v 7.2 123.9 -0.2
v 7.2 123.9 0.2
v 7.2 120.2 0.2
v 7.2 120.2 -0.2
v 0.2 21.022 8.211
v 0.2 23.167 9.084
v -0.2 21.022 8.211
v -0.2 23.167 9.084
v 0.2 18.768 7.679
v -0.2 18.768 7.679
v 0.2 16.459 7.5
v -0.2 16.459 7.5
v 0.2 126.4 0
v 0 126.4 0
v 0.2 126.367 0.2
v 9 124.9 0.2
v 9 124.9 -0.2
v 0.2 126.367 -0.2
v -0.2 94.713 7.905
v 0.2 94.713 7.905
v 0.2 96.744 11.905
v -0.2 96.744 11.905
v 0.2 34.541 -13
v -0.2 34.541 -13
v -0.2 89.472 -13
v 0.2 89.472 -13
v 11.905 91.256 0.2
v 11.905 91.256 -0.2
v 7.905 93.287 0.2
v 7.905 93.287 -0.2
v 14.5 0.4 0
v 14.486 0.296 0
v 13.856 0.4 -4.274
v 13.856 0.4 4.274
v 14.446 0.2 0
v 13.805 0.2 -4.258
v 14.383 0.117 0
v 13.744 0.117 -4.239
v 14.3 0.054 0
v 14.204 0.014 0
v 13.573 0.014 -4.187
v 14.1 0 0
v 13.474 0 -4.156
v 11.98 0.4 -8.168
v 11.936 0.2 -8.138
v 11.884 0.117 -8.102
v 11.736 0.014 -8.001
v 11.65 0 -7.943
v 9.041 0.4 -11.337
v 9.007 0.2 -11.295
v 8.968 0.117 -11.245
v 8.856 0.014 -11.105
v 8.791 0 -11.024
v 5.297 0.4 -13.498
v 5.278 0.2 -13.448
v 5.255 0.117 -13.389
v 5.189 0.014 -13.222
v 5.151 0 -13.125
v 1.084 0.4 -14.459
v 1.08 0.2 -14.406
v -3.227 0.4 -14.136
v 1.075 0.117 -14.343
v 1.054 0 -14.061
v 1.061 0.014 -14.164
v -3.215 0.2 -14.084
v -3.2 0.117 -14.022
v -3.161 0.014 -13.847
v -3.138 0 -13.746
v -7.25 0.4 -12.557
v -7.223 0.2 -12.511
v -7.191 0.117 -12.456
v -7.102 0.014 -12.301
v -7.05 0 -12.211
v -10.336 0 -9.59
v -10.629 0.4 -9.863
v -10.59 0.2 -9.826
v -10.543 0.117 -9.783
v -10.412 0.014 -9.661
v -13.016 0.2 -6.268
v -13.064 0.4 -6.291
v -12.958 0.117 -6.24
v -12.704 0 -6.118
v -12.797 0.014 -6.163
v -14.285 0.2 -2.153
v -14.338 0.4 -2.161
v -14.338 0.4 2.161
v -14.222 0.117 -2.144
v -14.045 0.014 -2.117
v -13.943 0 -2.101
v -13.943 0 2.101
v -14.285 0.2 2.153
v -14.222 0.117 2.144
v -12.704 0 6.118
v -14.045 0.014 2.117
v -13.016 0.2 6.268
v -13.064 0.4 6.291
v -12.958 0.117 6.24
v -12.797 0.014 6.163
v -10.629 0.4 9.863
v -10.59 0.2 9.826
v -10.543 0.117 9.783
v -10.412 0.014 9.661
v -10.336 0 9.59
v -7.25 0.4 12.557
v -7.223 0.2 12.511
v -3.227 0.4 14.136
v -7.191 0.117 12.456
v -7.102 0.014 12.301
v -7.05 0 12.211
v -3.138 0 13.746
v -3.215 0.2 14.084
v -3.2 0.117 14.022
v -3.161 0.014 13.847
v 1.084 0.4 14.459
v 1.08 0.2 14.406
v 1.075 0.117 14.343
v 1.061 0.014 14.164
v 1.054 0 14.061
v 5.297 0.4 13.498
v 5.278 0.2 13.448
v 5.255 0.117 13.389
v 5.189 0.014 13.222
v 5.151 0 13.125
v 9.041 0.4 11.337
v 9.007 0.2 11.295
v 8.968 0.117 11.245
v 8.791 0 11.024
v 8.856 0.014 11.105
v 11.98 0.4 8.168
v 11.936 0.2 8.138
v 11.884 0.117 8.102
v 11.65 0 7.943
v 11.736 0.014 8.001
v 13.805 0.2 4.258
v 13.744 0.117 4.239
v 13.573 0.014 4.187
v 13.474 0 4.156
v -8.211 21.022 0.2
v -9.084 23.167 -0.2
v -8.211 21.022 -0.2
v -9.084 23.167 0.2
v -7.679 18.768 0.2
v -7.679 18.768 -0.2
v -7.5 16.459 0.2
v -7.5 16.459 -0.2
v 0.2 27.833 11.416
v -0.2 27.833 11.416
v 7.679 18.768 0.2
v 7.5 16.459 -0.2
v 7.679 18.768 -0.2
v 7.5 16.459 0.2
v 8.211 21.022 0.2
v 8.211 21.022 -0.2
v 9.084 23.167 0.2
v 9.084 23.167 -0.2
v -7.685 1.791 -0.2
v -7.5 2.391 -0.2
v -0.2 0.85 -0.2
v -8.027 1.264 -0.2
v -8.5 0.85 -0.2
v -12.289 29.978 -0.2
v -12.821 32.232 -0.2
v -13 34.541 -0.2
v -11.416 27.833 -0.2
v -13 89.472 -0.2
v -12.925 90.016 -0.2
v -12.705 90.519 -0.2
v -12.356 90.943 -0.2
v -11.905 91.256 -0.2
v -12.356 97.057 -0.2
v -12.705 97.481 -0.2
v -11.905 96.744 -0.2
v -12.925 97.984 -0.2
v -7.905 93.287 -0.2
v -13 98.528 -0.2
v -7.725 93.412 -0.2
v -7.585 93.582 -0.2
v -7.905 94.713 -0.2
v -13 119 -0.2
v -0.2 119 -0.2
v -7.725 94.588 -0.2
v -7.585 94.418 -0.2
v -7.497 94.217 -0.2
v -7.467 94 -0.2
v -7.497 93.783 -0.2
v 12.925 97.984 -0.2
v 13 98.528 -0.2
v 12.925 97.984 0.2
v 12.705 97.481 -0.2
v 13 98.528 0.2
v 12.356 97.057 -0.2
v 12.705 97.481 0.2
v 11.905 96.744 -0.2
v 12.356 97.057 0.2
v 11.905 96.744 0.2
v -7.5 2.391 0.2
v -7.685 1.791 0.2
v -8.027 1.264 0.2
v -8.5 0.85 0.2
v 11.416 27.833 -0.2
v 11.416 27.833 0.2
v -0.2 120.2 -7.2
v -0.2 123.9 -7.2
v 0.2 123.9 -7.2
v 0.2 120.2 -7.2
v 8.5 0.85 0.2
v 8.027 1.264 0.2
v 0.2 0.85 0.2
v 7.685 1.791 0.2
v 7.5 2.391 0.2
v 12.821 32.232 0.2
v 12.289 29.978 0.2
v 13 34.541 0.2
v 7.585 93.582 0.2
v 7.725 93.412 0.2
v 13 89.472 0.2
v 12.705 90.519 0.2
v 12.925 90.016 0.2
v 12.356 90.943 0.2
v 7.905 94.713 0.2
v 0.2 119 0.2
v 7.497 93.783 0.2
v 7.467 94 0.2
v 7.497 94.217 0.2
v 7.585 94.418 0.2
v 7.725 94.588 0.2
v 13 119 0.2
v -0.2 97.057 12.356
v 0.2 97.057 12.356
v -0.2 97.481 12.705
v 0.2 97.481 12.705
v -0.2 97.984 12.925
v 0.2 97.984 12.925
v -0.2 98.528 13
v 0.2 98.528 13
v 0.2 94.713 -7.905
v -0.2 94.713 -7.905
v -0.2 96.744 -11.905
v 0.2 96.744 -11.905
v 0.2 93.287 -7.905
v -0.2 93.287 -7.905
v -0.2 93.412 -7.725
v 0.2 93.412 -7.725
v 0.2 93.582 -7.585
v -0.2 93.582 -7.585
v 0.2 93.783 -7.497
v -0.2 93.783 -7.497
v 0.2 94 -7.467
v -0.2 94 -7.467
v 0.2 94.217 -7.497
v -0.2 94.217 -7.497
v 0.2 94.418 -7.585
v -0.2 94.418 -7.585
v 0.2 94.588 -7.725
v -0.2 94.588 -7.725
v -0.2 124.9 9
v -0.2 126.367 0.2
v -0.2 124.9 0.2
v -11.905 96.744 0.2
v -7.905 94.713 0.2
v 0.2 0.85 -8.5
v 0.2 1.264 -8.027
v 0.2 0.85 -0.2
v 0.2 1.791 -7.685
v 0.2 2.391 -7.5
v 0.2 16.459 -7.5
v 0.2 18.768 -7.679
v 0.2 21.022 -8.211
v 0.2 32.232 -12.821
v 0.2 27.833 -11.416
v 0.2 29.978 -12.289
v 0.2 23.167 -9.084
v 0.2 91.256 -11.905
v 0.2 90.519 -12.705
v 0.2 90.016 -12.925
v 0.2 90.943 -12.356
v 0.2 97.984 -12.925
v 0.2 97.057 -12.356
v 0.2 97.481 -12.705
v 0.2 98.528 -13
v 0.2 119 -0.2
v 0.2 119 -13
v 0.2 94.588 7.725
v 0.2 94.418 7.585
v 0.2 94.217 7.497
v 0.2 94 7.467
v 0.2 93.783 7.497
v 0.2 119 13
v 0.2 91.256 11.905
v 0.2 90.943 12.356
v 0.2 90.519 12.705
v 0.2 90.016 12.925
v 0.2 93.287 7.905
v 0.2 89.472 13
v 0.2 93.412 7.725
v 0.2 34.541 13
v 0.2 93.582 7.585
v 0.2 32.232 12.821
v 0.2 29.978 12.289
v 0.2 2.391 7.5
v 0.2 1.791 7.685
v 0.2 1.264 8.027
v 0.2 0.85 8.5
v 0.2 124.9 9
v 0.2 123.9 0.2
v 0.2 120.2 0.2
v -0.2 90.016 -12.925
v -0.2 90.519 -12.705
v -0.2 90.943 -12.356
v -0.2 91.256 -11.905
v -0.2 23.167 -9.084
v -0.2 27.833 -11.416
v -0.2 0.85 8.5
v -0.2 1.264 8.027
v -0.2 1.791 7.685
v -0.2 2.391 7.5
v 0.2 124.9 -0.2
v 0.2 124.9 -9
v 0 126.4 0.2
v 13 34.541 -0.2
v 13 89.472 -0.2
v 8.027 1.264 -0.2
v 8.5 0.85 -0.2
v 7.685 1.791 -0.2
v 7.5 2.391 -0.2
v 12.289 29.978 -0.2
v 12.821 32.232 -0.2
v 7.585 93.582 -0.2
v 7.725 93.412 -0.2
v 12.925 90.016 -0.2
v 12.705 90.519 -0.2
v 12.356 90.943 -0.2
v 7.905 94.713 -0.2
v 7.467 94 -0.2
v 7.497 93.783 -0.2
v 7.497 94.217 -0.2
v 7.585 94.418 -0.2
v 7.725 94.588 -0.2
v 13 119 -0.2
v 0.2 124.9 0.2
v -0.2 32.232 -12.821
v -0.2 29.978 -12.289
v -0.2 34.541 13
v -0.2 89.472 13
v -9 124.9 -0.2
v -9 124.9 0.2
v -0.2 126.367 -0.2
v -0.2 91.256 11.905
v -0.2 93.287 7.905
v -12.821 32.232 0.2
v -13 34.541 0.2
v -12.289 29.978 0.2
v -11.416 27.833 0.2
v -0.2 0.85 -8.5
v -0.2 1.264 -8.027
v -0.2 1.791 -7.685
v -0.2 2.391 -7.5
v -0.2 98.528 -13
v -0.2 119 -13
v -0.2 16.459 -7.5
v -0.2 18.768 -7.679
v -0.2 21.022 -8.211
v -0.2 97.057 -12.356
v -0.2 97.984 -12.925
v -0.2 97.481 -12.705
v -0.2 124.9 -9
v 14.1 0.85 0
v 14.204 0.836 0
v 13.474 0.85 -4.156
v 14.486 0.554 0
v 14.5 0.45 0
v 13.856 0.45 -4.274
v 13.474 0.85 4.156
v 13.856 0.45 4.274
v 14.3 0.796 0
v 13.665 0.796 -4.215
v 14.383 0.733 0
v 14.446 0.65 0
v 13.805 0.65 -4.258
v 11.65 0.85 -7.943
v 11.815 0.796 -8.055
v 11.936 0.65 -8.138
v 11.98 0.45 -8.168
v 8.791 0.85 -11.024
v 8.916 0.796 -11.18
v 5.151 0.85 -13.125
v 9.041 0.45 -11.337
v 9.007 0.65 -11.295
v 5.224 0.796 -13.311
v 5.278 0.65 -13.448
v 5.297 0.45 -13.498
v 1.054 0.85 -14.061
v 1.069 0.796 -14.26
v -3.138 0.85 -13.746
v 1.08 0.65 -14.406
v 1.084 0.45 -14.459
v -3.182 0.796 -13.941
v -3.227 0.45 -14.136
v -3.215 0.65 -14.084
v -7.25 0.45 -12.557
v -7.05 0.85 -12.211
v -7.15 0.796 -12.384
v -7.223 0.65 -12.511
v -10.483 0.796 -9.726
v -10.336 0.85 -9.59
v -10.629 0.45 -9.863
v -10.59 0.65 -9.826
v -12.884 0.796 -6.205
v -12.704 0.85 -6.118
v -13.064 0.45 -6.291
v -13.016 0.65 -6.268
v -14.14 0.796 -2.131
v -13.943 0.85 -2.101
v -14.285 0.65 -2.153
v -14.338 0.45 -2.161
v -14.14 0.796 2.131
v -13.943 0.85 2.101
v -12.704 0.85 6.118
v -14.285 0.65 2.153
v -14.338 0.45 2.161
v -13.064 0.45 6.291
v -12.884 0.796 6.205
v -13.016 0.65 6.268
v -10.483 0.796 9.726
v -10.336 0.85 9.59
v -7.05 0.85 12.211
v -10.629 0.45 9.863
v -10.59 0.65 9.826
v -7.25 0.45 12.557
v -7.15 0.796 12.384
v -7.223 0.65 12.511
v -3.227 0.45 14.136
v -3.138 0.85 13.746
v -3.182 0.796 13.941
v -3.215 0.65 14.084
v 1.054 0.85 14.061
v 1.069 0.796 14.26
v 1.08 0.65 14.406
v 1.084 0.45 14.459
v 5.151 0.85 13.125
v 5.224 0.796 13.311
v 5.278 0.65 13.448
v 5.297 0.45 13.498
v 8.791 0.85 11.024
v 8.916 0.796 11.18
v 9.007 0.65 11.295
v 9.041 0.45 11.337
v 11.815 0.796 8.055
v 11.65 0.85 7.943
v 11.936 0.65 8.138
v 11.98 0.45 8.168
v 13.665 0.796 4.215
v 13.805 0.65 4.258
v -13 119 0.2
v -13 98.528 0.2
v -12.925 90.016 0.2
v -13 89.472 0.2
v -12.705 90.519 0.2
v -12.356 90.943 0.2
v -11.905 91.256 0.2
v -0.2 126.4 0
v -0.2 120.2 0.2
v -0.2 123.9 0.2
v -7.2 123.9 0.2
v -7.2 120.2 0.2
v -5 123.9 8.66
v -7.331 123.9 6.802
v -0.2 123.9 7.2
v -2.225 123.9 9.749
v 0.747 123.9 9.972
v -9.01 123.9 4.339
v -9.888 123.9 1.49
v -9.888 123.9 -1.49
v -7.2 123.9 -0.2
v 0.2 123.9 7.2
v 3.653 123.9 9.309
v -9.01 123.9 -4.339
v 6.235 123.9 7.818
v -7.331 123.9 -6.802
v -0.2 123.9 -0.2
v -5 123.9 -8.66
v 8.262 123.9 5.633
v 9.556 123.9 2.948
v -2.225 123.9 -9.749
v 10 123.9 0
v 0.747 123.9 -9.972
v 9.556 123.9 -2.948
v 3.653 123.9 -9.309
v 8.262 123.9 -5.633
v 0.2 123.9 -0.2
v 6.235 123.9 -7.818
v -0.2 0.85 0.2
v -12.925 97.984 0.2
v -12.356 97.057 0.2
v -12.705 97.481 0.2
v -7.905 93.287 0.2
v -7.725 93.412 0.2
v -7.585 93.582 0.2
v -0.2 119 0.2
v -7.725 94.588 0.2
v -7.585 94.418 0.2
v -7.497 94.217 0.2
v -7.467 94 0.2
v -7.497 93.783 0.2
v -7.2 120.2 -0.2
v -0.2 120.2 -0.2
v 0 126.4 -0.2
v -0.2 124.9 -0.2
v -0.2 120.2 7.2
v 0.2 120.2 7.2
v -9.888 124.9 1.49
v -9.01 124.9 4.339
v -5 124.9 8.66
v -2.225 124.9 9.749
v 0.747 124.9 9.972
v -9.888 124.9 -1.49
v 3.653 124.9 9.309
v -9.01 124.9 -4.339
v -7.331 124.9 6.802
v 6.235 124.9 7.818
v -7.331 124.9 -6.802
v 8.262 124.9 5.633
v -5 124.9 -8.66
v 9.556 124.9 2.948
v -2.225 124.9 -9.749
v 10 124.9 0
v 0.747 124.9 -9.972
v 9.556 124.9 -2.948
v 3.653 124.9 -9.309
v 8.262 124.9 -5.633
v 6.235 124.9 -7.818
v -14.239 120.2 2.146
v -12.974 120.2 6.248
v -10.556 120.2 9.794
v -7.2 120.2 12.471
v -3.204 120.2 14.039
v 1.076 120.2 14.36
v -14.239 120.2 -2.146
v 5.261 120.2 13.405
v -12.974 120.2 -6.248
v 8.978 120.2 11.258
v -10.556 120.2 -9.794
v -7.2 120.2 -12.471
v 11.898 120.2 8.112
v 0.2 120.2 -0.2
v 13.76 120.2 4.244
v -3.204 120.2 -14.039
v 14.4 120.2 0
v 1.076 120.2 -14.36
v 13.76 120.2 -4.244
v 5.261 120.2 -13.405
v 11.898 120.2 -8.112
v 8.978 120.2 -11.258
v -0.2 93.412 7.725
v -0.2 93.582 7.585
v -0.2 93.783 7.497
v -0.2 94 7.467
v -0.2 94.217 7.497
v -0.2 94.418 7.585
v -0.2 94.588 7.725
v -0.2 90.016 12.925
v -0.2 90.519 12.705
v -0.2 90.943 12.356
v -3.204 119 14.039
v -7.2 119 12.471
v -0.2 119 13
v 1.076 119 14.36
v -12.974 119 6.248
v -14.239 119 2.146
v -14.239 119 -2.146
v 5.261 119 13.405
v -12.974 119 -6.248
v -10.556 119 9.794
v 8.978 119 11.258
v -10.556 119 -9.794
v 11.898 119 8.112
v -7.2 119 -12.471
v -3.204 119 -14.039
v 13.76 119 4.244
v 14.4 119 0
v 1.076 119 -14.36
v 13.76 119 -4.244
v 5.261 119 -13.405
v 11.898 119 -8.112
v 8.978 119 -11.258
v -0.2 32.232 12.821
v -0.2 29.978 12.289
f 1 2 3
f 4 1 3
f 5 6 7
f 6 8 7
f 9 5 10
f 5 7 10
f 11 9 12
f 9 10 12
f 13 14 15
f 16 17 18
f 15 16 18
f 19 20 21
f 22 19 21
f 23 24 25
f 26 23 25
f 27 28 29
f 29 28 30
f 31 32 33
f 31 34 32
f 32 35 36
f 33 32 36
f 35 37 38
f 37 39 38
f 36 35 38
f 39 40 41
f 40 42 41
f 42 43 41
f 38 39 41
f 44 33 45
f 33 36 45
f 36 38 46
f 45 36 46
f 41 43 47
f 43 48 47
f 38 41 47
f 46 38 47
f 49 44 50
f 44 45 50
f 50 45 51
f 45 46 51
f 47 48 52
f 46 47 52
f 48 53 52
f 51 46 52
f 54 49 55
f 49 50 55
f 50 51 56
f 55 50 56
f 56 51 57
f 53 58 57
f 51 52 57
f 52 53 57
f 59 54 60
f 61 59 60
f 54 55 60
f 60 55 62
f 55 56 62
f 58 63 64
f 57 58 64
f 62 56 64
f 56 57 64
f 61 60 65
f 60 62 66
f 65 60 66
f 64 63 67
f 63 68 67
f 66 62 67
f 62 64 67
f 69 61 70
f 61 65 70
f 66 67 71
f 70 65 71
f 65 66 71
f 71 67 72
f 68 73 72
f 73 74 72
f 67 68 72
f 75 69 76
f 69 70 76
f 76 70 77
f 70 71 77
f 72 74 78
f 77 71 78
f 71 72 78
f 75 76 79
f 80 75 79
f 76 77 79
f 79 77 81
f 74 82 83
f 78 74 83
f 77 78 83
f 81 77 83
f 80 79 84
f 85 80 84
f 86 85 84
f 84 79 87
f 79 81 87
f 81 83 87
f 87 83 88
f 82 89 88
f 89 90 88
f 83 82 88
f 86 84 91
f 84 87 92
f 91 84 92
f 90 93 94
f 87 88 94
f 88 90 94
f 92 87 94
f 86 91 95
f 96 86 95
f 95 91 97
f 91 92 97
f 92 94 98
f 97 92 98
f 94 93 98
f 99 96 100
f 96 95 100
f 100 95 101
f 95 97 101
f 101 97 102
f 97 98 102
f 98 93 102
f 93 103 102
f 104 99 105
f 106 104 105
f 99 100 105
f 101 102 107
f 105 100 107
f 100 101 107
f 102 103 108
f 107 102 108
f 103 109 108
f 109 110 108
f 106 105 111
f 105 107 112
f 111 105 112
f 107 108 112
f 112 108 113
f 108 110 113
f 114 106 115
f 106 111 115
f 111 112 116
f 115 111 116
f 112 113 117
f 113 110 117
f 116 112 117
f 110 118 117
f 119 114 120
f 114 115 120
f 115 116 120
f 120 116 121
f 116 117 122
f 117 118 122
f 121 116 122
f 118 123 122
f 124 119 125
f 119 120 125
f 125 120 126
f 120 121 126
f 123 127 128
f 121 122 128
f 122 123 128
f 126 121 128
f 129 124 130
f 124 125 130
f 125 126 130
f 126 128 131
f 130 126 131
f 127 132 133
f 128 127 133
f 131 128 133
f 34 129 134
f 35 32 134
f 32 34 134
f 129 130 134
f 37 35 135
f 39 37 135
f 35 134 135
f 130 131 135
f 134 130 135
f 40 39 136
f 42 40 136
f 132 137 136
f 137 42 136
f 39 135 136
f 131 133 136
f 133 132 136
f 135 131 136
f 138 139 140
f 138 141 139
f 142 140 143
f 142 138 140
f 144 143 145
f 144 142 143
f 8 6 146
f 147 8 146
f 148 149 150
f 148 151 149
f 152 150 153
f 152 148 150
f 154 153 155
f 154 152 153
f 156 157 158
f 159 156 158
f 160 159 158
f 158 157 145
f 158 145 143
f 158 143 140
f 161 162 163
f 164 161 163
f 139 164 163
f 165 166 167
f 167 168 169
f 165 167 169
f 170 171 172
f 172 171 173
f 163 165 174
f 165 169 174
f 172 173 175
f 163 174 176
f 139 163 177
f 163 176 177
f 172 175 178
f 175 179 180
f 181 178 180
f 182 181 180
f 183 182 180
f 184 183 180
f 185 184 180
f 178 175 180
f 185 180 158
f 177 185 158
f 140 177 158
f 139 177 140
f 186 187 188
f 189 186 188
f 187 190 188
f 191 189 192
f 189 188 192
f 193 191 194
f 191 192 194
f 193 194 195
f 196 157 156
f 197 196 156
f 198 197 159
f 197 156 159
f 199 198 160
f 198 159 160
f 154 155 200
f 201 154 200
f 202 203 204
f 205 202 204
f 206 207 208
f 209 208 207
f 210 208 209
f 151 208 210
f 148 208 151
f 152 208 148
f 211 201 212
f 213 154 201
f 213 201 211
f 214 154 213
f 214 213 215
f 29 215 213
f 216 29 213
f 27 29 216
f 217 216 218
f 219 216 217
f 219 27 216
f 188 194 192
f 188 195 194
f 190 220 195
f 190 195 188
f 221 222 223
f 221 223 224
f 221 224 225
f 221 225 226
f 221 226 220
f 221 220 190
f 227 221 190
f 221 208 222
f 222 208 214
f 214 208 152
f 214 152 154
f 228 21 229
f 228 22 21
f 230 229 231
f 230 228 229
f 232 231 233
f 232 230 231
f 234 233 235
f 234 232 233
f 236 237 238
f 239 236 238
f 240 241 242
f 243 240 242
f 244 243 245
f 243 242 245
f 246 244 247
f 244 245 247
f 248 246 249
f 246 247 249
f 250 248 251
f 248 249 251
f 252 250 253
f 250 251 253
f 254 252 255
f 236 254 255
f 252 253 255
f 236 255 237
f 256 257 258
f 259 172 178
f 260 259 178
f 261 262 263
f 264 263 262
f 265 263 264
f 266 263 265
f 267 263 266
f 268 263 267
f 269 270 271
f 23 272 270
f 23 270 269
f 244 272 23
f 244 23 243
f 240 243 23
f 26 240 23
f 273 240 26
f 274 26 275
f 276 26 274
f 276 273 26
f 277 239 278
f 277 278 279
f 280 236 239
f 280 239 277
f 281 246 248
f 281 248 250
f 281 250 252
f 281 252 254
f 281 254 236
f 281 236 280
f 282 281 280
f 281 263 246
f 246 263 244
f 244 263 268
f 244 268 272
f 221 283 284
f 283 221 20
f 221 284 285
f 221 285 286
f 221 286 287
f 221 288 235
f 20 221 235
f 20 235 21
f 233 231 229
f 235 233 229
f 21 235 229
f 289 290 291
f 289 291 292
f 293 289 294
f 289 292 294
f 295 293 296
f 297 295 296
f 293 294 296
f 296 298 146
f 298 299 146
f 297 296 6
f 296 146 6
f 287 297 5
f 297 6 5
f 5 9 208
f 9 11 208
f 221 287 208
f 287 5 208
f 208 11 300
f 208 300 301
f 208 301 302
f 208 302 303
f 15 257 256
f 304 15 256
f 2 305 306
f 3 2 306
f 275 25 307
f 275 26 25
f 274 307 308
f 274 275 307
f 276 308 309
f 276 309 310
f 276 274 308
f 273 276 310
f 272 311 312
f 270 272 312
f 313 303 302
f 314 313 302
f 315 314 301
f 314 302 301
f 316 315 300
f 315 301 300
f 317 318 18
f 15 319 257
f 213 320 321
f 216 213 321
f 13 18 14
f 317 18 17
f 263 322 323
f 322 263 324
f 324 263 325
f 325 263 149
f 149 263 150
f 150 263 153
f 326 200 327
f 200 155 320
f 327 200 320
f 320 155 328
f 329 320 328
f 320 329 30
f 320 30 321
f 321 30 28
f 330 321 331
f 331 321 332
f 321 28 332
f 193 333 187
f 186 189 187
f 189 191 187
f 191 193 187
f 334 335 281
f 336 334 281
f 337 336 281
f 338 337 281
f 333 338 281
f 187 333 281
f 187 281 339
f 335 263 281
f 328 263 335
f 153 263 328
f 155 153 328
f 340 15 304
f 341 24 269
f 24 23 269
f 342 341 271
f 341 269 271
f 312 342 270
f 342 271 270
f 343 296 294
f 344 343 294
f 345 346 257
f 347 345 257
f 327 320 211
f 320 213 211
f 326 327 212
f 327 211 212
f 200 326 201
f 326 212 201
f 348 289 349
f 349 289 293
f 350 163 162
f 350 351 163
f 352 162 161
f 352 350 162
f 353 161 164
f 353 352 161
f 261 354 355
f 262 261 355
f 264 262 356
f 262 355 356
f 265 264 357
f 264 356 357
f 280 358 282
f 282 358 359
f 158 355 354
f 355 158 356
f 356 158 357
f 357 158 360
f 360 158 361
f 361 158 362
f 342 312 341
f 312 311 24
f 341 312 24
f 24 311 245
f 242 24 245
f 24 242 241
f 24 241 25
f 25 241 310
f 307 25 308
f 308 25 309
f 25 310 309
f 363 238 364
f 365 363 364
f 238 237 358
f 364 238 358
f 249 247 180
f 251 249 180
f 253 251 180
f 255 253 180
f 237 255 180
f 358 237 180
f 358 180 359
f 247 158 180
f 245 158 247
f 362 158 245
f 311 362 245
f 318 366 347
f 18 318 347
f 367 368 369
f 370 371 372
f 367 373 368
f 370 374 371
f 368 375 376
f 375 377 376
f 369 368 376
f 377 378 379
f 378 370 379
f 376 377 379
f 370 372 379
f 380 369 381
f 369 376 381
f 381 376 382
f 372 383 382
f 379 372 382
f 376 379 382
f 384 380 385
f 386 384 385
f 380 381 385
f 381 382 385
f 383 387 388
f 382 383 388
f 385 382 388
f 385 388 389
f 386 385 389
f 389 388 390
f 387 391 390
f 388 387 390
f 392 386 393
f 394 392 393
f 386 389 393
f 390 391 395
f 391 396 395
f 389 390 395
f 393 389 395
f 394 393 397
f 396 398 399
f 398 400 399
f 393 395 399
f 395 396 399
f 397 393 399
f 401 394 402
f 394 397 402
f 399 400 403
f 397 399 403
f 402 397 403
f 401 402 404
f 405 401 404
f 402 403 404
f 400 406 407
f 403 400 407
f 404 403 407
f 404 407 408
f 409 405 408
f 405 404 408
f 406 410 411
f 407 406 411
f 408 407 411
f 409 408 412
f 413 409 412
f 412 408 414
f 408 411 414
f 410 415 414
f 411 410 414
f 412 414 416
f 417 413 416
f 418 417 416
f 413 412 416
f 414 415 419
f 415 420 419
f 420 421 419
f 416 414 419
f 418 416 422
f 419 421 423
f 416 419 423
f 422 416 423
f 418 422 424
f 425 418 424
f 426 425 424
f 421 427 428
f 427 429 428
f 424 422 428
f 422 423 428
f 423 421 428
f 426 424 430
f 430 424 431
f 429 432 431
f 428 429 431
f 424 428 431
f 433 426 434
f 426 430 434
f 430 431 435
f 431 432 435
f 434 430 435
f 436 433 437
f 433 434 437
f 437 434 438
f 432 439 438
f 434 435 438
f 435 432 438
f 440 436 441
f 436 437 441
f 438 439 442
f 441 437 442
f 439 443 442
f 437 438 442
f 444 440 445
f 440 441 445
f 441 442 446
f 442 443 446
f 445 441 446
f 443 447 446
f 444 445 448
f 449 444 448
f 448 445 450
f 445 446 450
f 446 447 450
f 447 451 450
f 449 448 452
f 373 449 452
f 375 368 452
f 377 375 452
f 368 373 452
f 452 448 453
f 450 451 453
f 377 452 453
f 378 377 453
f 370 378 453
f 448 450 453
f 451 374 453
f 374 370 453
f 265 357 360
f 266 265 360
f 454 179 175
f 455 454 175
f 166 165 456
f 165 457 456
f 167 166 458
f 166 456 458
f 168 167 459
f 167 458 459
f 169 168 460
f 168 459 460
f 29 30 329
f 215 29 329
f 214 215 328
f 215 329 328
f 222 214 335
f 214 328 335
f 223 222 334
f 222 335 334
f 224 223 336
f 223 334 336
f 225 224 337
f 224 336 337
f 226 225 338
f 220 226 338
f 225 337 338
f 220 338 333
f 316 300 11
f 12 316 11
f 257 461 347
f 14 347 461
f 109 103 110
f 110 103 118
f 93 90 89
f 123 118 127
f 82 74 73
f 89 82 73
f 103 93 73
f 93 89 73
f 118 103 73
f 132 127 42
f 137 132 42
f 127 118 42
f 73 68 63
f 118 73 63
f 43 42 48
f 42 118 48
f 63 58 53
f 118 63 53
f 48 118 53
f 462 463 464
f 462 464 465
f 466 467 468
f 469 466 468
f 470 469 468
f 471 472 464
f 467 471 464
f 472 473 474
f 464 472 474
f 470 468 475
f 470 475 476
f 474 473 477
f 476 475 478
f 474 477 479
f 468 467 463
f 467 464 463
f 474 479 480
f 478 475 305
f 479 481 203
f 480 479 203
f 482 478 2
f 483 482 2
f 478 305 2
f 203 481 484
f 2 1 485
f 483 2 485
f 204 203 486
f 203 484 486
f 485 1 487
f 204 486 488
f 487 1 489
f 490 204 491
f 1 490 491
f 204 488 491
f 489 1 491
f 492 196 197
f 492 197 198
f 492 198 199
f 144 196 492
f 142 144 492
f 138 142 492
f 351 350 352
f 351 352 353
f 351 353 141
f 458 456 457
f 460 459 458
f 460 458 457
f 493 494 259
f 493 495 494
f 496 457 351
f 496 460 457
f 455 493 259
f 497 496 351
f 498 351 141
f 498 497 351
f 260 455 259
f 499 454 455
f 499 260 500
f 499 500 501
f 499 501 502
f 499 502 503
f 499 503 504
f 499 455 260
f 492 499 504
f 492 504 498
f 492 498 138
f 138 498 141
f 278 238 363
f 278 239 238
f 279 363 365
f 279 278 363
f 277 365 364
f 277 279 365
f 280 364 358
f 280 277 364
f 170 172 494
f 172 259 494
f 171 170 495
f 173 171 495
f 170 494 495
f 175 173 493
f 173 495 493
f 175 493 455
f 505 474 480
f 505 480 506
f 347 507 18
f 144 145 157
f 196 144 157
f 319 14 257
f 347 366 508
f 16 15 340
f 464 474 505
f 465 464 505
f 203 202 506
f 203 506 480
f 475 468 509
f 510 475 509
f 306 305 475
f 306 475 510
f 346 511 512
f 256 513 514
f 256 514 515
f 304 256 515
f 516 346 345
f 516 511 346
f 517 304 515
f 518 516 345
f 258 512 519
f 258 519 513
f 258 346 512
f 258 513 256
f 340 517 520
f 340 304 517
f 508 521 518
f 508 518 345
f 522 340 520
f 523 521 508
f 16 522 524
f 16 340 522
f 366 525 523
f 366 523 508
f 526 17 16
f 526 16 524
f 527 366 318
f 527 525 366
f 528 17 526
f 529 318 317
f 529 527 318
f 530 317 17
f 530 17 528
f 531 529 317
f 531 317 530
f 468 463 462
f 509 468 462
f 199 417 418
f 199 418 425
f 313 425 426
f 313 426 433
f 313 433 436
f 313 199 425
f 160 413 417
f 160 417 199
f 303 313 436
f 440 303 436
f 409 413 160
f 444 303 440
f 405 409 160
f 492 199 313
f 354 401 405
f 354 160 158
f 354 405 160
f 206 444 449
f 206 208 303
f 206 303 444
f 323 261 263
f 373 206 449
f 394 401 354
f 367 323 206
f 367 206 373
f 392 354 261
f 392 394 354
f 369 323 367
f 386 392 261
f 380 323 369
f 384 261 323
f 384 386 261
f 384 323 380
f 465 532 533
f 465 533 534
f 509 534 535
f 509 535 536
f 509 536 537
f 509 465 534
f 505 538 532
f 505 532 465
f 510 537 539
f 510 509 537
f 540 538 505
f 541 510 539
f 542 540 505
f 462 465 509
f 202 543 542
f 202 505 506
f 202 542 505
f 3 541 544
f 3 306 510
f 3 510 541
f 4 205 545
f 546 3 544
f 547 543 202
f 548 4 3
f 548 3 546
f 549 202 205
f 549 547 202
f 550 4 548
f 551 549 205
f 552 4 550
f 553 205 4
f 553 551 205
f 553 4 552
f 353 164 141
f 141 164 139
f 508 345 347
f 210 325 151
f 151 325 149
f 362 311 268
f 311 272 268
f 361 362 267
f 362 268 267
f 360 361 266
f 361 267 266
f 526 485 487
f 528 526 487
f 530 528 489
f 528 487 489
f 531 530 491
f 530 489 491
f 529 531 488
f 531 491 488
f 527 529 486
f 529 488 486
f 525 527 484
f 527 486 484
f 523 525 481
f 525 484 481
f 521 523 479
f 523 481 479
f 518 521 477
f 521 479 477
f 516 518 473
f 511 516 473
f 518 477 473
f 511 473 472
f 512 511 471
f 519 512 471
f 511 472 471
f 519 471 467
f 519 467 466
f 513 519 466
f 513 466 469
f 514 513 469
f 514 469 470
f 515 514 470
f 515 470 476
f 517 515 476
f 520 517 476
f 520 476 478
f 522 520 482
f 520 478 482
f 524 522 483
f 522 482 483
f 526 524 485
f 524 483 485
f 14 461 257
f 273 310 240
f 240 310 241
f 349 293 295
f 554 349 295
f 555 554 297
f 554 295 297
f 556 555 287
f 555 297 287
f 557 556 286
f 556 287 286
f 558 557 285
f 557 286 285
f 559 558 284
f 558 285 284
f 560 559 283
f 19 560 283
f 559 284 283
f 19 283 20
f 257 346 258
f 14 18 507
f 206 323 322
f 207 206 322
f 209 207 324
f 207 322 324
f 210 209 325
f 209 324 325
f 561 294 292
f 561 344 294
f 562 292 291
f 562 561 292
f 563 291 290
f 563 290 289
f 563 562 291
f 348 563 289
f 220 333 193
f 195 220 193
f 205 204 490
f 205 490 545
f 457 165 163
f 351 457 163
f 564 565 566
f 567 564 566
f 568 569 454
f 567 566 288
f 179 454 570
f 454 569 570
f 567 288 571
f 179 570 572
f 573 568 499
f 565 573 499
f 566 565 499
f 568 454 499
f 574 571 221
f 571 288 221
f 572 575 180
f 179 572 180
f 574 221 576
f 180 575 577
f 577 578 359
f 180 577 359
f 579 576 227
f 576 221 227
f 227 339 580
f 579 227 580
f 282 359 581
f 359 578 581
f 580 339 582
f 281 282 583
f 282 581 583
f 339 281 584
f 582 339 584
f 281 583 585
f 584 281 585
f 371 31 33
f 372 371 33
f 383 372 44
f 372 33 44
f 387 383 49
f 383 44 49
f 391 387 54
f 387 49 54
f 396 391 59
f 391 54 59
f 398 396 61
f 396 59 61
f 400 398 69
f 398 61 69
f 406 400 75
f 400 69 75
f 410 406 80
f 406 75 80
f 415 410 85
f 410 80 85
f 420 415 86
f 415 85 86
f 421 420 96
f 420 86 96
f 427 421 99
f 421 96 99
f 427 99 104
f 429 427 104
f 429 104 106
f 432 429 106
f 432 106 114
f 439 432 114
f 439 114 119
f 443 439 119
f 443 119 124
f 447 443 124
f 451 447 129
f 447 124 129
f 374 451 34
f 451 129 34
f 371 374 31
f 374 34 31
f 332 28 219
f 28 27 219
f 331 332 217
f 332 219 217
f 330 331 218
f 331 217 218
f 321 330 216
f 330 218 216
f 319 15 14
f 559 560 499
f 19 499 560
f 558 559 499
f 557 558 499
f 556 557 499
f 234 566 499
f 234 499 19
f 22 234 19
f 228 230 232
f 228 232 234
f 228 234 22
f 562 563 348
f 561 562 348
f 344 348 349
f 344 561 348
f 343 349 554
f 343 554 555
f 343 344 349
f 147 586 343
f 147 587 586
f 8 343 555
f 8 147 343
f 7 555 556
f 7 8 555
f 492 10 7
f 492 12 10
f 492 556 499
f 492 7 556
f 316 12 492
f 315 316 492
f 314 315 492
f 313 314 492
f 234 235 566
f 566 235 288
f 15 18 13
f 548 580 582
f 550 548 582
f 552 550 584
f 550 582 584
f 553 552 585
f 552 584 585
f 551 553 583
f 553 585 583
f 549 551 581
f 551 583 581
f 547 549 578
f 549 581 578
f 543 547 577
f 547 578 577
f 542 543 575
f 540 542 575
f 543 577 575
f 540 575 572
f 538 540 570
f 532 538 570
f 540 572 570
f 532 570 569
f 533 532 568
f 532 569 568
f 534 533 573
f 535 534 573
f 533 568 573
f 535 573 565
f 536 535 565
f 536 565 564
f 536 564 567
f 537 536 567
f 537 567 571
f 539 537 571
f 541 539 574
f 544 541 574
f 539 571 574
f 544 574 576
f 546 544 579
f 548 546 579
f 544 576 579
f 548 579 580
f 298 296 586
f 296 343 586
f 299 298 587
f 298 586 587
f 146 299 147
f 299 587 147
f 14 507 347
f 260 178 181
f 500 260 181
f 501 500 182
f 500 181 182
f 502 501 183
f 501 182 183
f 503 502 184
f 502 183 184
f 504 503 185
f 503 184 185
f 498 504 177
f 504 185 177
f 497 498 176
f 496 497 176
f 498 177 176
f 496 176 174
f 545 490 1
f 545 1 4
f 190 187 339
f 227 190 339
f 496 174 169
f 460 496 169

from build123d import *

# Parameters (mm, degrees)
EXTRUDE_START         = -0.2
EXTRUDE_1_OUTLINE_W   = 0.4
EXTRUDE_1_OUTLINE_H   = 3.7
EXTRUDE_1_DEPTH       = 0.4
EXTRUDE_START_2       = -7.2
EXTRUDE_1_2_OUTLINE_W = 0.4
EXTRUDE_1_2_OUTLINE_H = 3.7
EXTRUDE_1_2_DEPTH     = 7
EXTRUDE_START_3       = 119
EXTRUDE_1_3_OUTLINE_R = 14.4
EXTRUDE_1_3_DEPTH     = 1.2
EXTRUDE_1_4_OUTLINE_R = 14.5
EXTRUDE_1_4_DEPTH     = 0.85
EXTRUDE_START_4       = 123.9
EXTRUDE_1_5_OUTLINE_R = 10
EXTRUDE_1_5_DEPTH     = 1
EXTRUDE_1_6_DEPTH     = 0.4
CUT_EXTRUDE_1_DEPTH   = 129.075368436
CUT_EXTRUDE_2_DEPTH   = 129.075368436
DRAFT_1_ANGLE         = 63.434948823
DRAFT_2_ANGLE         = 63.434948823
RIB_1_REACH           = 130.053
SKETCH_4_WALL_W       = 267.026519706
SKETCH_4_WALL_H       = 0.4
RIB_2_REACH           = 130.053
SKETCH_5_WALL_W       = 267.026519706
SKETCH_5_WALL_H       = 0.4
RIB_3_REACH           = 130.053
SKETCH_6_WALL_W       = 267.026519706
SKETCH_6_WALL_H       = 0.4
RIB_4_REACH           = 130.053
SKETCH_7_WALL_W       = 261.805134662
SKETCH_7_WALL_H       = 0.4
RIB_5_REACH           = 130.053
SKETCH_8_WALL_W       = 261.805134662
SKETCH_8_WALL_H       = 0.4
RIB_6_REACH           = 130.053
SKETCH_9_WALL_W       = 261.805134662
SKETCH_9_WALL_H       = 0.4
RIB_START             = -0.2
RIB_7_DEPTH           = 0.4
RIB_8_DEPTH           = 0.4
FILLET_1_R            = 0.4
FILLET_2_R            = 2
FILLET_3_R            = 15


with BuildPart() as part:
    # 凸台-拉伸1: read off the stored shape, not the designer's step
    # 凸台-拉伸1 outline → 凸台-拉伸1 (new body)
    with BuildSketch(Plane.XY.offset(EXTRUDE_START)):
        Polygon((0, 126.4), (-0.2, 126.366666667), (-0.2, 124.9), (9, 124.9), (0.2, 126.366666667), align=None)
        with BuildLine():
            Line((13, 31), (13, 119))
            Line((13, 119), (-13, 119))
            Line((-13, 119), (-13, 20))
            Line((-13, 20), (-7.5, 20))
            Line((-7.5, 20), (-7.5, 2.391335203))
            ThreePointArc((-7.5, 2.391335203), (-7.838080215, 1.515615965), (-8.5, 0.85))
            Line((-8.5, 0.85), (8.5, 0.85))
            ThreePointArc((8.5, 0.85), (7.838080215, 1.515615965), (7.5, 2.391335203))
            Line((7.5, 2.391335203), (7.5, 31))
            Line((7.5, 31), (13, 31))
        make_face()
        with Locations((0, 122.05)):
            Rectangle(EXTRUDE_1_OUTLINE_W, EXTRUDE_1_OUTLINE_H)
    extrude(amount=EXTRUDE_1_DEPTH)

    # Extrude 1 2 outline → Extrude 1 2 (add)
    with BuildSketch(Plane.XY.offset(EXTRUDE_START_2)):
        with Locations((0, 122.05)):
            Rectangle(EXTRUDE_1_2_OUTLINE_W, EXTRUDE_1_2_OUTLINE_H)
    extrude(amount=EXTRUDE_1_2_DEPTH)

    # Extrude 1 3 outline → Extrude 1 3 (add)
    with BuildSketch(Plane(origin=(0, 0, 0), x_dir=(1, 0, 0), z_dir=(0, 1, 0)).offset(EXTRUDE_START_3)):
        Circle(EXTRUDE_1_3_OUTLINE_R)
    extrude(amount=EXTRUDE_1_3_DEPTH)

    # Extrude 1 4 outline → Extrude 1 4 (add)
    with BuildSketch(Plane(origin=(0, 0, 0), x_dir=(1, 0, 0), z_dir=(0, 1, 0))):
        Circle(EXTRUDE_1_4_OUTLINE_R)
    extrude(amount=EXTRUDE_1_4_DEPTH)

    # Extrude 1 5 outline → Extrude 1 5 (add)
    with BuildSketch(Plane(origin=(0, 0, 0), x_dir=(1, 0, 0), z_dir=(0, 1, 0)).offset(EXTRUDE_START_4)):
        Circle(EXTRUDE_1_5_OUTLINE_R)
    extrude(amount=EXTRUDE_1_5_DEPTH)

    # Extrude 1 6 outline → Extrude 1 6 (add)
    with BuildSketch(Plane.YZ.offset(EXTRUDE_START)):
        Polygon((126.366666667, -0.2), (126.4, 0), (126.366666667, 0.2), align=None)
    extrude(amount=EXTRUDE_1_6_DEPTH)

    # 草图2 → 切除-拉伸1 (cut, through all)
    with BuildSketch(Plane(origin=(0, 0, -0.2), x_dir=(-1, 0, 0), z_dir=(0, 0, -1))):
        with BuildLine():
            Line((-13, 90.7), (-7.905050667, 93.286666585))
            ThreePointArc((-7.905050667, 93.286666585), (-7.467204555, 94), (-7.905050667, 94.713333415))
            Line((-7.905050667, 94.713333415), (-13, 97.3))
            Line((-13, 97.3), (-13, 90.7))
        make_face()
    extrude(amount=-CUT_EXTRUDE_1_DEPTH, mode=Mode.SUBTRACT)

    # 草图3 → 切除-拉伸2 (cut, through all)
    with BuildSketch(Plane(origin=(0, 0, -0.2), x_dir=(-1, 0, 0), z_dir=(0, 0, -1))):
        with BuildLine():
            Line((13, 97.3), (7.905050667, 94.713333415))
            ThreePointArc((7.905050667, 94.713333415), (7.467204555, 94), (7.905050667, 93.286666585))
            Line((7.905050667, 93.286666585), (13, 90.7))
            Line((13, 90.7), (13, 97.3))
        make_face()
    extrude(amount=-CUT_EXTRUDE_2_DEPTH, mode=Mode.SUBTRACT)

    # 拔模1
    draft_1_faces = [part.faces().sort_by_distance(p)[0] for p in [
        (-10.25, 20, 0),
    ]]
    draft(draft_1_faces, Plane(origin=(-7.5, 0, -0.2), x_dir=(0, 0, -1), z_dir=(-1, 0, 0)), DRAFT_1_ANGLE)

    # 拔模2
    draft_2_faces = [part.faces().sort_by_distance(p)[0] for p in [
        (10.25, 31, 0),
    ]]
    draft(draft_2_faces, Plane(origin=(13, 0, 0.2), x_dir=(0, 0, 1), z_dir=(1, 0, 0)), DRAFT_2_ANGLE)

    # 草图4 wall → 筋1 (add, up to next)
    with BuildSketch(Plane(origin=(0, 125.633333334, 4.6), x_dir=(0, -0.164398987342, 0.986393923826), z_dir=(0, -0.986393923826, -0.164398987342)), mode=Mode.PRIVATE) as rib_1_sk1:
        Rectangle(SKETCH_4_WALL_W, SKETCH_4_WALL_H)
    rib_1_tool1 = extrude(rib_1_sk1.sketch, amount=RIB_1_REACH, mode=Mode.PRIVATE) - part.part
    add(rib_1_tool1.solids().sort_by_distance((0, 125.633333334, 4.6))[0])

    # 草图5 wall → 筋2 (add, up to next)
    with BuildSketch(Plane(origin=(-4.6, 125.633333334, 0), x_dir=(0.986393923826, 0.164398987342, 0), z_dir=(0.164398987342, -0.986393923826, 0)), mode=Mode.PRIVATE) as rib_2_sk1:
        Rectangle(SKETCH_5_WALL_W, SKETCH_5_WALL_H)
    rib_2_tool1 = extrude(rib_2_sk1.sketch, amount=RIB_2_REACH, mode=Mode.PRIVATE) - part.part
    add(rib_2_tool1.solids().sort_by_distance((-4.6, 125.633333334, 0))[0])

    # 草图6 wall → 筋3 (add, up to next)
    with BuildSketch(Plane(origin=(0, 125.633333334, -4.6), x_dir=(0, 0.164398987342, 0.986393923826), z_dir=(0, -0.986393923826, 0.164398987342)), mode=Mode.PRIVATE) as rib_3_sk1:
        Rectangle(SKETCH_6_WALL_W, SKETCH_6_WALL_H)
    rib_3_tool1 = extrude(rib_3_sk1.sketch, amount=RIB_3_REACH, mode=Mode.PRIVATE) - part.part
    add(rib_3_tool1.solids().sort_by_distance((0, 125.633333334, -4.6))[0])

    # 草图7 wall → 筋4 (add, up to next)
    with BuildSketch(Plane(origin=(-7.2, 122.05, 0), x_dir=(0, -1, 0), z_dir=(1, 0, 0)), mode=Mode.PRIVATE) as rib_4_sk1:
        Rectangle(SKETCH_7_WALL_W, SKETCH_7_WALL_H)
    rib_4_tool1 = extrude(rib_4_sk1.sketch, amount=RIB_4_REACH, mode=Mode.PRIVATE) - part.part
    add(rib_4_tool1.solids().sort_by_distance((-7.2, 122.05, 0))[0])

    # 草图8 wall → 筋5 (add, up to next)
    with BuildSketch(Plane(origin=(0, 122.05, 7.2), x_dir=(0, -1, 0), z_dir=(0, 0, -1)), mode=Mode.PRIVATE) as rib_5_sk1:
        Rectangle(SKETCH_8_WALL_W, SKETCH_8_WALL_H)
    rib_5_tool1 = extrude(rib_5_sk1.sketch, amount=RIB_5_REACH, mode=Mode.PRIVATE) - part.part
    add(rib_5_tool1.solids().sort_by_distance((0, 122.05, 7.2))[0])

    # 草图9 wall → 筋6 (add, up to next)
    with BuildSketch(Plane(origin=(7.2, 122.05, 0), x_dir=(0, -1, 0), z_dir=(-1, 0, 0)), mode=Mode.PRIVATE) as rib_6_sk1:
        Rectangle(SKETCH_9_WALL_W, SKETCH_9_WALL_H)
    rib_6_tool1 = extrude(rib_6_sk1.sketch, amount=RIB_6_REACH, mode=Mode.PRIVATE) - part.part
    add(rib_6_tool1.solids().sort_by_distance((7.2, 122.05, 0))[0])

    # 筋7: read off the stored shape, not the designer's step
    # 筋7 outline → 筋7 (add)
    with BuildSketch(Plane(origin=(0, 0, 0), x_dir=(0, 0, -1), z_dir=(1, 0, 0)).offset(RIB_START)):
        with BuildLine():
            Line((7.905050667, 94.713333415), (13, 97.3))
            Line((13, 97.3), (13, 119))
            Line((13, 119), (0.2, 119))
            Line((0.2, 119), (0.2, 0.85))
            Line((0.2, 0.85), (8.5, 0.85))
            ThreePointArc((8.5, 0.85), (7.838080215, 1.515615965), (7.5, 2.391335203))
            Line((7.5, 2.391335203), (7.5, 20))
            Line((7.5, 20), (13, 31))
            Line((13, 31), (13, 90.7))
            Line((13, 90.7), (7.905050667, 93.286666585))
            ThreePointArc((7.905050667, 93.286666585), (7.467204555, 94), (7.905050667, 94.713333415))
        make_face()
    extrude(amount=RIB_7_DEPTH)

    # 筋8: read off the stored shape, not the designer's step
    # 筋8 outline → 筋8 (add)
    with BuildSketch(Plane(origin=(0, 0, 0), x_dir=(0, -1, 0), z_dir=(-1, 0, 0)).offset(RIB_START)):
        with BuildLine():
            Line((-94.713333415, 7.905050667), (-97.3, 13))
            Line((-97.3, 13), (-119, 13))
            Line((-119, 13), (-119, 0.2))
            Line((-119, 0.2), (-0.85, 0.2))
            Line((-0.85, 0.2), (-0.85, 8.5))
            ThreePointArc((-0.85, 8.5), (-1.515615965, 7.838080215), (-2.391335203, 7.5))
            Line((-2.391335203, 7.5), (-20, 7.5))
            Line((-20, 7.5), (-31, 13))
            Line((-31, 13), (-90.7, 13))
            Line((-90.7, 13), (-93.286666585, 7.905050667))
            ThreePointArc((-93.286666585, 7.905050667), (-94, 7.467204555), (-94.713333415, 7.905050667))
        make_face()
    extrude(amount=RIB_8_DEPTH)

    # 圆角1
    fillet_1_edges = [part.edges().sort_by_distance(p)[0] for p in [
        (-14.5, 0, 0),
        (-14.5, 0.85, 0),
    ]]
    fillet(fillet_1_edges, radius=FILLET_1_R)

    # 圆角2
    fillet_2_edges = [part.edges().sort_by_distance(p)[0] for p in [
        (13, 90.7, 0),
        (13, 97.3, 0),
        (-13, 97.3, 0),
        (-13, 90.7, 0),
        (0, 90.7, -13),
        (0, 97.3, -13),
        (0, 90.7, 13),
        (0, 97.3, 13),
    ]]
    fillet(fillet_2_edges, radius=FILLET_2_R)

    # 圆角3
    fillet_3_edges = [part.edges().sort_by_distance(p)[0] for p in [
        (-13, 31, 0),
        (-7.5, 20, 0),
        (7.5, 20, 0),
        (13, 31, 0),
        (0, 20, -7.5),
        (0, 31, -13),
        (0, 20, 7.5),
        (0, 31, 13),
    ]]
    fillet(fillet_3_edges, radius=FILLET_3_R)


solid = part.part
